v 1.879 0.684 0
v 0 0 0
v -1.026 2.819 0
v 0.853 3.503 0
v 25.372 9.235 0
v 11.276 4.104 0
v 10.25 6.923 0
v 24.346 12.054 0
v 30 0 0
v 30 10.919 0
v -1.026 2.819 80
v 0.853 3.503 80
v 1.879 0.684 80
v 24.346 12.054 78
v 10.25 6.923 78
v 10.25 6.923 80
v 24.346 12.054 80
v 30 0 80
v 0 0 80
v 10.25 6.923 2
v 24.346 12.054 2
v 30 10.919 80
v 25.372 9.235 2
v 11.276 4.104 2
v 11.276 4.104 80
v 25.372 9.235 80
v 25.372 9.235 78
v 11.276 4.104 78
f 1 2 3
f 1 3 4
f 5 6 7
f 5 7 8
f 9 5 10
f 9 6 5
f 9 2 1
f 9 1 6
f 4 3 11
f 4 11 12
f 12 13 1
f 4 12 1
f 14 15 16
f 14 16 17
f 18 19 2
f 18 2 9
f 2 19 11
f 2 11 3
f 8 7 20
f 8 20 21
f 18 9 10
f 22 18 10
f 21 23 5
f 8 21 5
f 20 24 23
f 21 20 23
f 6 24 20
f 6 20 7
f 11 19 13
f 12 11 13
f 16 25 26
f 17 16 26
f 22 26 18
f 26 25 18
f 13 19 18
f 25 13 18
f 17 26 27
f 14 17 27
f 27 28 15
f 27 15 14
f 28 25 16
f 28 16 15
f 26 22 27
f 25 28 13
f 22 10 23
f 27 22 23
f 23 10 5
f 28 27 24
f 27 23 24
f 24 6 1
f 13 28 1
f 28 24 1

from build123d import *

# Parameters (mm, degrees)
BOSS_EXTRUDE1_DEPTH = 80
SKETCH2_W           = 2
SKETCH2_H           = 80
SKETCH2_W_2         = 15
SKETCH2_H_2         = 2
BOSS_EXTRUDE2_DEPTH = 3


with BuildPart() as part:
    # Sketch1 → Boss-Extrude1 (new body)
    with BuildSketch(Plane.XY):
        Polygon((0, 0), (30, 0), (30, 10.919107028), align=None)
    extrude(amount=BOSS_EXTRUDE1_DEPTH)

    # Sketch2 → Boss-Extrude2 (add)
    with BuildSketch(Plane(origin=(0, 0, 0), x_dir=(0.9396926207859082, 0.34202014332566943, 0), z_dir=(-0.34202014332566943, 0.9396926207859082, 0))):
        with Locations((1, -40)):
            Rectangle(SKETCH2_W, SKETCH2_H)
        with Locations((19.5, -1)):
            Rectangle(SKETCH2_W_2, SKETCH2_H_2)
        with Locations((19.5, -79)):
            Rectangle(SKETCH2_W_2, SKETCH2_H_2)
    extrude(amount=BOSS_EXTRUDE2_DEPTH)


solid = part.part
